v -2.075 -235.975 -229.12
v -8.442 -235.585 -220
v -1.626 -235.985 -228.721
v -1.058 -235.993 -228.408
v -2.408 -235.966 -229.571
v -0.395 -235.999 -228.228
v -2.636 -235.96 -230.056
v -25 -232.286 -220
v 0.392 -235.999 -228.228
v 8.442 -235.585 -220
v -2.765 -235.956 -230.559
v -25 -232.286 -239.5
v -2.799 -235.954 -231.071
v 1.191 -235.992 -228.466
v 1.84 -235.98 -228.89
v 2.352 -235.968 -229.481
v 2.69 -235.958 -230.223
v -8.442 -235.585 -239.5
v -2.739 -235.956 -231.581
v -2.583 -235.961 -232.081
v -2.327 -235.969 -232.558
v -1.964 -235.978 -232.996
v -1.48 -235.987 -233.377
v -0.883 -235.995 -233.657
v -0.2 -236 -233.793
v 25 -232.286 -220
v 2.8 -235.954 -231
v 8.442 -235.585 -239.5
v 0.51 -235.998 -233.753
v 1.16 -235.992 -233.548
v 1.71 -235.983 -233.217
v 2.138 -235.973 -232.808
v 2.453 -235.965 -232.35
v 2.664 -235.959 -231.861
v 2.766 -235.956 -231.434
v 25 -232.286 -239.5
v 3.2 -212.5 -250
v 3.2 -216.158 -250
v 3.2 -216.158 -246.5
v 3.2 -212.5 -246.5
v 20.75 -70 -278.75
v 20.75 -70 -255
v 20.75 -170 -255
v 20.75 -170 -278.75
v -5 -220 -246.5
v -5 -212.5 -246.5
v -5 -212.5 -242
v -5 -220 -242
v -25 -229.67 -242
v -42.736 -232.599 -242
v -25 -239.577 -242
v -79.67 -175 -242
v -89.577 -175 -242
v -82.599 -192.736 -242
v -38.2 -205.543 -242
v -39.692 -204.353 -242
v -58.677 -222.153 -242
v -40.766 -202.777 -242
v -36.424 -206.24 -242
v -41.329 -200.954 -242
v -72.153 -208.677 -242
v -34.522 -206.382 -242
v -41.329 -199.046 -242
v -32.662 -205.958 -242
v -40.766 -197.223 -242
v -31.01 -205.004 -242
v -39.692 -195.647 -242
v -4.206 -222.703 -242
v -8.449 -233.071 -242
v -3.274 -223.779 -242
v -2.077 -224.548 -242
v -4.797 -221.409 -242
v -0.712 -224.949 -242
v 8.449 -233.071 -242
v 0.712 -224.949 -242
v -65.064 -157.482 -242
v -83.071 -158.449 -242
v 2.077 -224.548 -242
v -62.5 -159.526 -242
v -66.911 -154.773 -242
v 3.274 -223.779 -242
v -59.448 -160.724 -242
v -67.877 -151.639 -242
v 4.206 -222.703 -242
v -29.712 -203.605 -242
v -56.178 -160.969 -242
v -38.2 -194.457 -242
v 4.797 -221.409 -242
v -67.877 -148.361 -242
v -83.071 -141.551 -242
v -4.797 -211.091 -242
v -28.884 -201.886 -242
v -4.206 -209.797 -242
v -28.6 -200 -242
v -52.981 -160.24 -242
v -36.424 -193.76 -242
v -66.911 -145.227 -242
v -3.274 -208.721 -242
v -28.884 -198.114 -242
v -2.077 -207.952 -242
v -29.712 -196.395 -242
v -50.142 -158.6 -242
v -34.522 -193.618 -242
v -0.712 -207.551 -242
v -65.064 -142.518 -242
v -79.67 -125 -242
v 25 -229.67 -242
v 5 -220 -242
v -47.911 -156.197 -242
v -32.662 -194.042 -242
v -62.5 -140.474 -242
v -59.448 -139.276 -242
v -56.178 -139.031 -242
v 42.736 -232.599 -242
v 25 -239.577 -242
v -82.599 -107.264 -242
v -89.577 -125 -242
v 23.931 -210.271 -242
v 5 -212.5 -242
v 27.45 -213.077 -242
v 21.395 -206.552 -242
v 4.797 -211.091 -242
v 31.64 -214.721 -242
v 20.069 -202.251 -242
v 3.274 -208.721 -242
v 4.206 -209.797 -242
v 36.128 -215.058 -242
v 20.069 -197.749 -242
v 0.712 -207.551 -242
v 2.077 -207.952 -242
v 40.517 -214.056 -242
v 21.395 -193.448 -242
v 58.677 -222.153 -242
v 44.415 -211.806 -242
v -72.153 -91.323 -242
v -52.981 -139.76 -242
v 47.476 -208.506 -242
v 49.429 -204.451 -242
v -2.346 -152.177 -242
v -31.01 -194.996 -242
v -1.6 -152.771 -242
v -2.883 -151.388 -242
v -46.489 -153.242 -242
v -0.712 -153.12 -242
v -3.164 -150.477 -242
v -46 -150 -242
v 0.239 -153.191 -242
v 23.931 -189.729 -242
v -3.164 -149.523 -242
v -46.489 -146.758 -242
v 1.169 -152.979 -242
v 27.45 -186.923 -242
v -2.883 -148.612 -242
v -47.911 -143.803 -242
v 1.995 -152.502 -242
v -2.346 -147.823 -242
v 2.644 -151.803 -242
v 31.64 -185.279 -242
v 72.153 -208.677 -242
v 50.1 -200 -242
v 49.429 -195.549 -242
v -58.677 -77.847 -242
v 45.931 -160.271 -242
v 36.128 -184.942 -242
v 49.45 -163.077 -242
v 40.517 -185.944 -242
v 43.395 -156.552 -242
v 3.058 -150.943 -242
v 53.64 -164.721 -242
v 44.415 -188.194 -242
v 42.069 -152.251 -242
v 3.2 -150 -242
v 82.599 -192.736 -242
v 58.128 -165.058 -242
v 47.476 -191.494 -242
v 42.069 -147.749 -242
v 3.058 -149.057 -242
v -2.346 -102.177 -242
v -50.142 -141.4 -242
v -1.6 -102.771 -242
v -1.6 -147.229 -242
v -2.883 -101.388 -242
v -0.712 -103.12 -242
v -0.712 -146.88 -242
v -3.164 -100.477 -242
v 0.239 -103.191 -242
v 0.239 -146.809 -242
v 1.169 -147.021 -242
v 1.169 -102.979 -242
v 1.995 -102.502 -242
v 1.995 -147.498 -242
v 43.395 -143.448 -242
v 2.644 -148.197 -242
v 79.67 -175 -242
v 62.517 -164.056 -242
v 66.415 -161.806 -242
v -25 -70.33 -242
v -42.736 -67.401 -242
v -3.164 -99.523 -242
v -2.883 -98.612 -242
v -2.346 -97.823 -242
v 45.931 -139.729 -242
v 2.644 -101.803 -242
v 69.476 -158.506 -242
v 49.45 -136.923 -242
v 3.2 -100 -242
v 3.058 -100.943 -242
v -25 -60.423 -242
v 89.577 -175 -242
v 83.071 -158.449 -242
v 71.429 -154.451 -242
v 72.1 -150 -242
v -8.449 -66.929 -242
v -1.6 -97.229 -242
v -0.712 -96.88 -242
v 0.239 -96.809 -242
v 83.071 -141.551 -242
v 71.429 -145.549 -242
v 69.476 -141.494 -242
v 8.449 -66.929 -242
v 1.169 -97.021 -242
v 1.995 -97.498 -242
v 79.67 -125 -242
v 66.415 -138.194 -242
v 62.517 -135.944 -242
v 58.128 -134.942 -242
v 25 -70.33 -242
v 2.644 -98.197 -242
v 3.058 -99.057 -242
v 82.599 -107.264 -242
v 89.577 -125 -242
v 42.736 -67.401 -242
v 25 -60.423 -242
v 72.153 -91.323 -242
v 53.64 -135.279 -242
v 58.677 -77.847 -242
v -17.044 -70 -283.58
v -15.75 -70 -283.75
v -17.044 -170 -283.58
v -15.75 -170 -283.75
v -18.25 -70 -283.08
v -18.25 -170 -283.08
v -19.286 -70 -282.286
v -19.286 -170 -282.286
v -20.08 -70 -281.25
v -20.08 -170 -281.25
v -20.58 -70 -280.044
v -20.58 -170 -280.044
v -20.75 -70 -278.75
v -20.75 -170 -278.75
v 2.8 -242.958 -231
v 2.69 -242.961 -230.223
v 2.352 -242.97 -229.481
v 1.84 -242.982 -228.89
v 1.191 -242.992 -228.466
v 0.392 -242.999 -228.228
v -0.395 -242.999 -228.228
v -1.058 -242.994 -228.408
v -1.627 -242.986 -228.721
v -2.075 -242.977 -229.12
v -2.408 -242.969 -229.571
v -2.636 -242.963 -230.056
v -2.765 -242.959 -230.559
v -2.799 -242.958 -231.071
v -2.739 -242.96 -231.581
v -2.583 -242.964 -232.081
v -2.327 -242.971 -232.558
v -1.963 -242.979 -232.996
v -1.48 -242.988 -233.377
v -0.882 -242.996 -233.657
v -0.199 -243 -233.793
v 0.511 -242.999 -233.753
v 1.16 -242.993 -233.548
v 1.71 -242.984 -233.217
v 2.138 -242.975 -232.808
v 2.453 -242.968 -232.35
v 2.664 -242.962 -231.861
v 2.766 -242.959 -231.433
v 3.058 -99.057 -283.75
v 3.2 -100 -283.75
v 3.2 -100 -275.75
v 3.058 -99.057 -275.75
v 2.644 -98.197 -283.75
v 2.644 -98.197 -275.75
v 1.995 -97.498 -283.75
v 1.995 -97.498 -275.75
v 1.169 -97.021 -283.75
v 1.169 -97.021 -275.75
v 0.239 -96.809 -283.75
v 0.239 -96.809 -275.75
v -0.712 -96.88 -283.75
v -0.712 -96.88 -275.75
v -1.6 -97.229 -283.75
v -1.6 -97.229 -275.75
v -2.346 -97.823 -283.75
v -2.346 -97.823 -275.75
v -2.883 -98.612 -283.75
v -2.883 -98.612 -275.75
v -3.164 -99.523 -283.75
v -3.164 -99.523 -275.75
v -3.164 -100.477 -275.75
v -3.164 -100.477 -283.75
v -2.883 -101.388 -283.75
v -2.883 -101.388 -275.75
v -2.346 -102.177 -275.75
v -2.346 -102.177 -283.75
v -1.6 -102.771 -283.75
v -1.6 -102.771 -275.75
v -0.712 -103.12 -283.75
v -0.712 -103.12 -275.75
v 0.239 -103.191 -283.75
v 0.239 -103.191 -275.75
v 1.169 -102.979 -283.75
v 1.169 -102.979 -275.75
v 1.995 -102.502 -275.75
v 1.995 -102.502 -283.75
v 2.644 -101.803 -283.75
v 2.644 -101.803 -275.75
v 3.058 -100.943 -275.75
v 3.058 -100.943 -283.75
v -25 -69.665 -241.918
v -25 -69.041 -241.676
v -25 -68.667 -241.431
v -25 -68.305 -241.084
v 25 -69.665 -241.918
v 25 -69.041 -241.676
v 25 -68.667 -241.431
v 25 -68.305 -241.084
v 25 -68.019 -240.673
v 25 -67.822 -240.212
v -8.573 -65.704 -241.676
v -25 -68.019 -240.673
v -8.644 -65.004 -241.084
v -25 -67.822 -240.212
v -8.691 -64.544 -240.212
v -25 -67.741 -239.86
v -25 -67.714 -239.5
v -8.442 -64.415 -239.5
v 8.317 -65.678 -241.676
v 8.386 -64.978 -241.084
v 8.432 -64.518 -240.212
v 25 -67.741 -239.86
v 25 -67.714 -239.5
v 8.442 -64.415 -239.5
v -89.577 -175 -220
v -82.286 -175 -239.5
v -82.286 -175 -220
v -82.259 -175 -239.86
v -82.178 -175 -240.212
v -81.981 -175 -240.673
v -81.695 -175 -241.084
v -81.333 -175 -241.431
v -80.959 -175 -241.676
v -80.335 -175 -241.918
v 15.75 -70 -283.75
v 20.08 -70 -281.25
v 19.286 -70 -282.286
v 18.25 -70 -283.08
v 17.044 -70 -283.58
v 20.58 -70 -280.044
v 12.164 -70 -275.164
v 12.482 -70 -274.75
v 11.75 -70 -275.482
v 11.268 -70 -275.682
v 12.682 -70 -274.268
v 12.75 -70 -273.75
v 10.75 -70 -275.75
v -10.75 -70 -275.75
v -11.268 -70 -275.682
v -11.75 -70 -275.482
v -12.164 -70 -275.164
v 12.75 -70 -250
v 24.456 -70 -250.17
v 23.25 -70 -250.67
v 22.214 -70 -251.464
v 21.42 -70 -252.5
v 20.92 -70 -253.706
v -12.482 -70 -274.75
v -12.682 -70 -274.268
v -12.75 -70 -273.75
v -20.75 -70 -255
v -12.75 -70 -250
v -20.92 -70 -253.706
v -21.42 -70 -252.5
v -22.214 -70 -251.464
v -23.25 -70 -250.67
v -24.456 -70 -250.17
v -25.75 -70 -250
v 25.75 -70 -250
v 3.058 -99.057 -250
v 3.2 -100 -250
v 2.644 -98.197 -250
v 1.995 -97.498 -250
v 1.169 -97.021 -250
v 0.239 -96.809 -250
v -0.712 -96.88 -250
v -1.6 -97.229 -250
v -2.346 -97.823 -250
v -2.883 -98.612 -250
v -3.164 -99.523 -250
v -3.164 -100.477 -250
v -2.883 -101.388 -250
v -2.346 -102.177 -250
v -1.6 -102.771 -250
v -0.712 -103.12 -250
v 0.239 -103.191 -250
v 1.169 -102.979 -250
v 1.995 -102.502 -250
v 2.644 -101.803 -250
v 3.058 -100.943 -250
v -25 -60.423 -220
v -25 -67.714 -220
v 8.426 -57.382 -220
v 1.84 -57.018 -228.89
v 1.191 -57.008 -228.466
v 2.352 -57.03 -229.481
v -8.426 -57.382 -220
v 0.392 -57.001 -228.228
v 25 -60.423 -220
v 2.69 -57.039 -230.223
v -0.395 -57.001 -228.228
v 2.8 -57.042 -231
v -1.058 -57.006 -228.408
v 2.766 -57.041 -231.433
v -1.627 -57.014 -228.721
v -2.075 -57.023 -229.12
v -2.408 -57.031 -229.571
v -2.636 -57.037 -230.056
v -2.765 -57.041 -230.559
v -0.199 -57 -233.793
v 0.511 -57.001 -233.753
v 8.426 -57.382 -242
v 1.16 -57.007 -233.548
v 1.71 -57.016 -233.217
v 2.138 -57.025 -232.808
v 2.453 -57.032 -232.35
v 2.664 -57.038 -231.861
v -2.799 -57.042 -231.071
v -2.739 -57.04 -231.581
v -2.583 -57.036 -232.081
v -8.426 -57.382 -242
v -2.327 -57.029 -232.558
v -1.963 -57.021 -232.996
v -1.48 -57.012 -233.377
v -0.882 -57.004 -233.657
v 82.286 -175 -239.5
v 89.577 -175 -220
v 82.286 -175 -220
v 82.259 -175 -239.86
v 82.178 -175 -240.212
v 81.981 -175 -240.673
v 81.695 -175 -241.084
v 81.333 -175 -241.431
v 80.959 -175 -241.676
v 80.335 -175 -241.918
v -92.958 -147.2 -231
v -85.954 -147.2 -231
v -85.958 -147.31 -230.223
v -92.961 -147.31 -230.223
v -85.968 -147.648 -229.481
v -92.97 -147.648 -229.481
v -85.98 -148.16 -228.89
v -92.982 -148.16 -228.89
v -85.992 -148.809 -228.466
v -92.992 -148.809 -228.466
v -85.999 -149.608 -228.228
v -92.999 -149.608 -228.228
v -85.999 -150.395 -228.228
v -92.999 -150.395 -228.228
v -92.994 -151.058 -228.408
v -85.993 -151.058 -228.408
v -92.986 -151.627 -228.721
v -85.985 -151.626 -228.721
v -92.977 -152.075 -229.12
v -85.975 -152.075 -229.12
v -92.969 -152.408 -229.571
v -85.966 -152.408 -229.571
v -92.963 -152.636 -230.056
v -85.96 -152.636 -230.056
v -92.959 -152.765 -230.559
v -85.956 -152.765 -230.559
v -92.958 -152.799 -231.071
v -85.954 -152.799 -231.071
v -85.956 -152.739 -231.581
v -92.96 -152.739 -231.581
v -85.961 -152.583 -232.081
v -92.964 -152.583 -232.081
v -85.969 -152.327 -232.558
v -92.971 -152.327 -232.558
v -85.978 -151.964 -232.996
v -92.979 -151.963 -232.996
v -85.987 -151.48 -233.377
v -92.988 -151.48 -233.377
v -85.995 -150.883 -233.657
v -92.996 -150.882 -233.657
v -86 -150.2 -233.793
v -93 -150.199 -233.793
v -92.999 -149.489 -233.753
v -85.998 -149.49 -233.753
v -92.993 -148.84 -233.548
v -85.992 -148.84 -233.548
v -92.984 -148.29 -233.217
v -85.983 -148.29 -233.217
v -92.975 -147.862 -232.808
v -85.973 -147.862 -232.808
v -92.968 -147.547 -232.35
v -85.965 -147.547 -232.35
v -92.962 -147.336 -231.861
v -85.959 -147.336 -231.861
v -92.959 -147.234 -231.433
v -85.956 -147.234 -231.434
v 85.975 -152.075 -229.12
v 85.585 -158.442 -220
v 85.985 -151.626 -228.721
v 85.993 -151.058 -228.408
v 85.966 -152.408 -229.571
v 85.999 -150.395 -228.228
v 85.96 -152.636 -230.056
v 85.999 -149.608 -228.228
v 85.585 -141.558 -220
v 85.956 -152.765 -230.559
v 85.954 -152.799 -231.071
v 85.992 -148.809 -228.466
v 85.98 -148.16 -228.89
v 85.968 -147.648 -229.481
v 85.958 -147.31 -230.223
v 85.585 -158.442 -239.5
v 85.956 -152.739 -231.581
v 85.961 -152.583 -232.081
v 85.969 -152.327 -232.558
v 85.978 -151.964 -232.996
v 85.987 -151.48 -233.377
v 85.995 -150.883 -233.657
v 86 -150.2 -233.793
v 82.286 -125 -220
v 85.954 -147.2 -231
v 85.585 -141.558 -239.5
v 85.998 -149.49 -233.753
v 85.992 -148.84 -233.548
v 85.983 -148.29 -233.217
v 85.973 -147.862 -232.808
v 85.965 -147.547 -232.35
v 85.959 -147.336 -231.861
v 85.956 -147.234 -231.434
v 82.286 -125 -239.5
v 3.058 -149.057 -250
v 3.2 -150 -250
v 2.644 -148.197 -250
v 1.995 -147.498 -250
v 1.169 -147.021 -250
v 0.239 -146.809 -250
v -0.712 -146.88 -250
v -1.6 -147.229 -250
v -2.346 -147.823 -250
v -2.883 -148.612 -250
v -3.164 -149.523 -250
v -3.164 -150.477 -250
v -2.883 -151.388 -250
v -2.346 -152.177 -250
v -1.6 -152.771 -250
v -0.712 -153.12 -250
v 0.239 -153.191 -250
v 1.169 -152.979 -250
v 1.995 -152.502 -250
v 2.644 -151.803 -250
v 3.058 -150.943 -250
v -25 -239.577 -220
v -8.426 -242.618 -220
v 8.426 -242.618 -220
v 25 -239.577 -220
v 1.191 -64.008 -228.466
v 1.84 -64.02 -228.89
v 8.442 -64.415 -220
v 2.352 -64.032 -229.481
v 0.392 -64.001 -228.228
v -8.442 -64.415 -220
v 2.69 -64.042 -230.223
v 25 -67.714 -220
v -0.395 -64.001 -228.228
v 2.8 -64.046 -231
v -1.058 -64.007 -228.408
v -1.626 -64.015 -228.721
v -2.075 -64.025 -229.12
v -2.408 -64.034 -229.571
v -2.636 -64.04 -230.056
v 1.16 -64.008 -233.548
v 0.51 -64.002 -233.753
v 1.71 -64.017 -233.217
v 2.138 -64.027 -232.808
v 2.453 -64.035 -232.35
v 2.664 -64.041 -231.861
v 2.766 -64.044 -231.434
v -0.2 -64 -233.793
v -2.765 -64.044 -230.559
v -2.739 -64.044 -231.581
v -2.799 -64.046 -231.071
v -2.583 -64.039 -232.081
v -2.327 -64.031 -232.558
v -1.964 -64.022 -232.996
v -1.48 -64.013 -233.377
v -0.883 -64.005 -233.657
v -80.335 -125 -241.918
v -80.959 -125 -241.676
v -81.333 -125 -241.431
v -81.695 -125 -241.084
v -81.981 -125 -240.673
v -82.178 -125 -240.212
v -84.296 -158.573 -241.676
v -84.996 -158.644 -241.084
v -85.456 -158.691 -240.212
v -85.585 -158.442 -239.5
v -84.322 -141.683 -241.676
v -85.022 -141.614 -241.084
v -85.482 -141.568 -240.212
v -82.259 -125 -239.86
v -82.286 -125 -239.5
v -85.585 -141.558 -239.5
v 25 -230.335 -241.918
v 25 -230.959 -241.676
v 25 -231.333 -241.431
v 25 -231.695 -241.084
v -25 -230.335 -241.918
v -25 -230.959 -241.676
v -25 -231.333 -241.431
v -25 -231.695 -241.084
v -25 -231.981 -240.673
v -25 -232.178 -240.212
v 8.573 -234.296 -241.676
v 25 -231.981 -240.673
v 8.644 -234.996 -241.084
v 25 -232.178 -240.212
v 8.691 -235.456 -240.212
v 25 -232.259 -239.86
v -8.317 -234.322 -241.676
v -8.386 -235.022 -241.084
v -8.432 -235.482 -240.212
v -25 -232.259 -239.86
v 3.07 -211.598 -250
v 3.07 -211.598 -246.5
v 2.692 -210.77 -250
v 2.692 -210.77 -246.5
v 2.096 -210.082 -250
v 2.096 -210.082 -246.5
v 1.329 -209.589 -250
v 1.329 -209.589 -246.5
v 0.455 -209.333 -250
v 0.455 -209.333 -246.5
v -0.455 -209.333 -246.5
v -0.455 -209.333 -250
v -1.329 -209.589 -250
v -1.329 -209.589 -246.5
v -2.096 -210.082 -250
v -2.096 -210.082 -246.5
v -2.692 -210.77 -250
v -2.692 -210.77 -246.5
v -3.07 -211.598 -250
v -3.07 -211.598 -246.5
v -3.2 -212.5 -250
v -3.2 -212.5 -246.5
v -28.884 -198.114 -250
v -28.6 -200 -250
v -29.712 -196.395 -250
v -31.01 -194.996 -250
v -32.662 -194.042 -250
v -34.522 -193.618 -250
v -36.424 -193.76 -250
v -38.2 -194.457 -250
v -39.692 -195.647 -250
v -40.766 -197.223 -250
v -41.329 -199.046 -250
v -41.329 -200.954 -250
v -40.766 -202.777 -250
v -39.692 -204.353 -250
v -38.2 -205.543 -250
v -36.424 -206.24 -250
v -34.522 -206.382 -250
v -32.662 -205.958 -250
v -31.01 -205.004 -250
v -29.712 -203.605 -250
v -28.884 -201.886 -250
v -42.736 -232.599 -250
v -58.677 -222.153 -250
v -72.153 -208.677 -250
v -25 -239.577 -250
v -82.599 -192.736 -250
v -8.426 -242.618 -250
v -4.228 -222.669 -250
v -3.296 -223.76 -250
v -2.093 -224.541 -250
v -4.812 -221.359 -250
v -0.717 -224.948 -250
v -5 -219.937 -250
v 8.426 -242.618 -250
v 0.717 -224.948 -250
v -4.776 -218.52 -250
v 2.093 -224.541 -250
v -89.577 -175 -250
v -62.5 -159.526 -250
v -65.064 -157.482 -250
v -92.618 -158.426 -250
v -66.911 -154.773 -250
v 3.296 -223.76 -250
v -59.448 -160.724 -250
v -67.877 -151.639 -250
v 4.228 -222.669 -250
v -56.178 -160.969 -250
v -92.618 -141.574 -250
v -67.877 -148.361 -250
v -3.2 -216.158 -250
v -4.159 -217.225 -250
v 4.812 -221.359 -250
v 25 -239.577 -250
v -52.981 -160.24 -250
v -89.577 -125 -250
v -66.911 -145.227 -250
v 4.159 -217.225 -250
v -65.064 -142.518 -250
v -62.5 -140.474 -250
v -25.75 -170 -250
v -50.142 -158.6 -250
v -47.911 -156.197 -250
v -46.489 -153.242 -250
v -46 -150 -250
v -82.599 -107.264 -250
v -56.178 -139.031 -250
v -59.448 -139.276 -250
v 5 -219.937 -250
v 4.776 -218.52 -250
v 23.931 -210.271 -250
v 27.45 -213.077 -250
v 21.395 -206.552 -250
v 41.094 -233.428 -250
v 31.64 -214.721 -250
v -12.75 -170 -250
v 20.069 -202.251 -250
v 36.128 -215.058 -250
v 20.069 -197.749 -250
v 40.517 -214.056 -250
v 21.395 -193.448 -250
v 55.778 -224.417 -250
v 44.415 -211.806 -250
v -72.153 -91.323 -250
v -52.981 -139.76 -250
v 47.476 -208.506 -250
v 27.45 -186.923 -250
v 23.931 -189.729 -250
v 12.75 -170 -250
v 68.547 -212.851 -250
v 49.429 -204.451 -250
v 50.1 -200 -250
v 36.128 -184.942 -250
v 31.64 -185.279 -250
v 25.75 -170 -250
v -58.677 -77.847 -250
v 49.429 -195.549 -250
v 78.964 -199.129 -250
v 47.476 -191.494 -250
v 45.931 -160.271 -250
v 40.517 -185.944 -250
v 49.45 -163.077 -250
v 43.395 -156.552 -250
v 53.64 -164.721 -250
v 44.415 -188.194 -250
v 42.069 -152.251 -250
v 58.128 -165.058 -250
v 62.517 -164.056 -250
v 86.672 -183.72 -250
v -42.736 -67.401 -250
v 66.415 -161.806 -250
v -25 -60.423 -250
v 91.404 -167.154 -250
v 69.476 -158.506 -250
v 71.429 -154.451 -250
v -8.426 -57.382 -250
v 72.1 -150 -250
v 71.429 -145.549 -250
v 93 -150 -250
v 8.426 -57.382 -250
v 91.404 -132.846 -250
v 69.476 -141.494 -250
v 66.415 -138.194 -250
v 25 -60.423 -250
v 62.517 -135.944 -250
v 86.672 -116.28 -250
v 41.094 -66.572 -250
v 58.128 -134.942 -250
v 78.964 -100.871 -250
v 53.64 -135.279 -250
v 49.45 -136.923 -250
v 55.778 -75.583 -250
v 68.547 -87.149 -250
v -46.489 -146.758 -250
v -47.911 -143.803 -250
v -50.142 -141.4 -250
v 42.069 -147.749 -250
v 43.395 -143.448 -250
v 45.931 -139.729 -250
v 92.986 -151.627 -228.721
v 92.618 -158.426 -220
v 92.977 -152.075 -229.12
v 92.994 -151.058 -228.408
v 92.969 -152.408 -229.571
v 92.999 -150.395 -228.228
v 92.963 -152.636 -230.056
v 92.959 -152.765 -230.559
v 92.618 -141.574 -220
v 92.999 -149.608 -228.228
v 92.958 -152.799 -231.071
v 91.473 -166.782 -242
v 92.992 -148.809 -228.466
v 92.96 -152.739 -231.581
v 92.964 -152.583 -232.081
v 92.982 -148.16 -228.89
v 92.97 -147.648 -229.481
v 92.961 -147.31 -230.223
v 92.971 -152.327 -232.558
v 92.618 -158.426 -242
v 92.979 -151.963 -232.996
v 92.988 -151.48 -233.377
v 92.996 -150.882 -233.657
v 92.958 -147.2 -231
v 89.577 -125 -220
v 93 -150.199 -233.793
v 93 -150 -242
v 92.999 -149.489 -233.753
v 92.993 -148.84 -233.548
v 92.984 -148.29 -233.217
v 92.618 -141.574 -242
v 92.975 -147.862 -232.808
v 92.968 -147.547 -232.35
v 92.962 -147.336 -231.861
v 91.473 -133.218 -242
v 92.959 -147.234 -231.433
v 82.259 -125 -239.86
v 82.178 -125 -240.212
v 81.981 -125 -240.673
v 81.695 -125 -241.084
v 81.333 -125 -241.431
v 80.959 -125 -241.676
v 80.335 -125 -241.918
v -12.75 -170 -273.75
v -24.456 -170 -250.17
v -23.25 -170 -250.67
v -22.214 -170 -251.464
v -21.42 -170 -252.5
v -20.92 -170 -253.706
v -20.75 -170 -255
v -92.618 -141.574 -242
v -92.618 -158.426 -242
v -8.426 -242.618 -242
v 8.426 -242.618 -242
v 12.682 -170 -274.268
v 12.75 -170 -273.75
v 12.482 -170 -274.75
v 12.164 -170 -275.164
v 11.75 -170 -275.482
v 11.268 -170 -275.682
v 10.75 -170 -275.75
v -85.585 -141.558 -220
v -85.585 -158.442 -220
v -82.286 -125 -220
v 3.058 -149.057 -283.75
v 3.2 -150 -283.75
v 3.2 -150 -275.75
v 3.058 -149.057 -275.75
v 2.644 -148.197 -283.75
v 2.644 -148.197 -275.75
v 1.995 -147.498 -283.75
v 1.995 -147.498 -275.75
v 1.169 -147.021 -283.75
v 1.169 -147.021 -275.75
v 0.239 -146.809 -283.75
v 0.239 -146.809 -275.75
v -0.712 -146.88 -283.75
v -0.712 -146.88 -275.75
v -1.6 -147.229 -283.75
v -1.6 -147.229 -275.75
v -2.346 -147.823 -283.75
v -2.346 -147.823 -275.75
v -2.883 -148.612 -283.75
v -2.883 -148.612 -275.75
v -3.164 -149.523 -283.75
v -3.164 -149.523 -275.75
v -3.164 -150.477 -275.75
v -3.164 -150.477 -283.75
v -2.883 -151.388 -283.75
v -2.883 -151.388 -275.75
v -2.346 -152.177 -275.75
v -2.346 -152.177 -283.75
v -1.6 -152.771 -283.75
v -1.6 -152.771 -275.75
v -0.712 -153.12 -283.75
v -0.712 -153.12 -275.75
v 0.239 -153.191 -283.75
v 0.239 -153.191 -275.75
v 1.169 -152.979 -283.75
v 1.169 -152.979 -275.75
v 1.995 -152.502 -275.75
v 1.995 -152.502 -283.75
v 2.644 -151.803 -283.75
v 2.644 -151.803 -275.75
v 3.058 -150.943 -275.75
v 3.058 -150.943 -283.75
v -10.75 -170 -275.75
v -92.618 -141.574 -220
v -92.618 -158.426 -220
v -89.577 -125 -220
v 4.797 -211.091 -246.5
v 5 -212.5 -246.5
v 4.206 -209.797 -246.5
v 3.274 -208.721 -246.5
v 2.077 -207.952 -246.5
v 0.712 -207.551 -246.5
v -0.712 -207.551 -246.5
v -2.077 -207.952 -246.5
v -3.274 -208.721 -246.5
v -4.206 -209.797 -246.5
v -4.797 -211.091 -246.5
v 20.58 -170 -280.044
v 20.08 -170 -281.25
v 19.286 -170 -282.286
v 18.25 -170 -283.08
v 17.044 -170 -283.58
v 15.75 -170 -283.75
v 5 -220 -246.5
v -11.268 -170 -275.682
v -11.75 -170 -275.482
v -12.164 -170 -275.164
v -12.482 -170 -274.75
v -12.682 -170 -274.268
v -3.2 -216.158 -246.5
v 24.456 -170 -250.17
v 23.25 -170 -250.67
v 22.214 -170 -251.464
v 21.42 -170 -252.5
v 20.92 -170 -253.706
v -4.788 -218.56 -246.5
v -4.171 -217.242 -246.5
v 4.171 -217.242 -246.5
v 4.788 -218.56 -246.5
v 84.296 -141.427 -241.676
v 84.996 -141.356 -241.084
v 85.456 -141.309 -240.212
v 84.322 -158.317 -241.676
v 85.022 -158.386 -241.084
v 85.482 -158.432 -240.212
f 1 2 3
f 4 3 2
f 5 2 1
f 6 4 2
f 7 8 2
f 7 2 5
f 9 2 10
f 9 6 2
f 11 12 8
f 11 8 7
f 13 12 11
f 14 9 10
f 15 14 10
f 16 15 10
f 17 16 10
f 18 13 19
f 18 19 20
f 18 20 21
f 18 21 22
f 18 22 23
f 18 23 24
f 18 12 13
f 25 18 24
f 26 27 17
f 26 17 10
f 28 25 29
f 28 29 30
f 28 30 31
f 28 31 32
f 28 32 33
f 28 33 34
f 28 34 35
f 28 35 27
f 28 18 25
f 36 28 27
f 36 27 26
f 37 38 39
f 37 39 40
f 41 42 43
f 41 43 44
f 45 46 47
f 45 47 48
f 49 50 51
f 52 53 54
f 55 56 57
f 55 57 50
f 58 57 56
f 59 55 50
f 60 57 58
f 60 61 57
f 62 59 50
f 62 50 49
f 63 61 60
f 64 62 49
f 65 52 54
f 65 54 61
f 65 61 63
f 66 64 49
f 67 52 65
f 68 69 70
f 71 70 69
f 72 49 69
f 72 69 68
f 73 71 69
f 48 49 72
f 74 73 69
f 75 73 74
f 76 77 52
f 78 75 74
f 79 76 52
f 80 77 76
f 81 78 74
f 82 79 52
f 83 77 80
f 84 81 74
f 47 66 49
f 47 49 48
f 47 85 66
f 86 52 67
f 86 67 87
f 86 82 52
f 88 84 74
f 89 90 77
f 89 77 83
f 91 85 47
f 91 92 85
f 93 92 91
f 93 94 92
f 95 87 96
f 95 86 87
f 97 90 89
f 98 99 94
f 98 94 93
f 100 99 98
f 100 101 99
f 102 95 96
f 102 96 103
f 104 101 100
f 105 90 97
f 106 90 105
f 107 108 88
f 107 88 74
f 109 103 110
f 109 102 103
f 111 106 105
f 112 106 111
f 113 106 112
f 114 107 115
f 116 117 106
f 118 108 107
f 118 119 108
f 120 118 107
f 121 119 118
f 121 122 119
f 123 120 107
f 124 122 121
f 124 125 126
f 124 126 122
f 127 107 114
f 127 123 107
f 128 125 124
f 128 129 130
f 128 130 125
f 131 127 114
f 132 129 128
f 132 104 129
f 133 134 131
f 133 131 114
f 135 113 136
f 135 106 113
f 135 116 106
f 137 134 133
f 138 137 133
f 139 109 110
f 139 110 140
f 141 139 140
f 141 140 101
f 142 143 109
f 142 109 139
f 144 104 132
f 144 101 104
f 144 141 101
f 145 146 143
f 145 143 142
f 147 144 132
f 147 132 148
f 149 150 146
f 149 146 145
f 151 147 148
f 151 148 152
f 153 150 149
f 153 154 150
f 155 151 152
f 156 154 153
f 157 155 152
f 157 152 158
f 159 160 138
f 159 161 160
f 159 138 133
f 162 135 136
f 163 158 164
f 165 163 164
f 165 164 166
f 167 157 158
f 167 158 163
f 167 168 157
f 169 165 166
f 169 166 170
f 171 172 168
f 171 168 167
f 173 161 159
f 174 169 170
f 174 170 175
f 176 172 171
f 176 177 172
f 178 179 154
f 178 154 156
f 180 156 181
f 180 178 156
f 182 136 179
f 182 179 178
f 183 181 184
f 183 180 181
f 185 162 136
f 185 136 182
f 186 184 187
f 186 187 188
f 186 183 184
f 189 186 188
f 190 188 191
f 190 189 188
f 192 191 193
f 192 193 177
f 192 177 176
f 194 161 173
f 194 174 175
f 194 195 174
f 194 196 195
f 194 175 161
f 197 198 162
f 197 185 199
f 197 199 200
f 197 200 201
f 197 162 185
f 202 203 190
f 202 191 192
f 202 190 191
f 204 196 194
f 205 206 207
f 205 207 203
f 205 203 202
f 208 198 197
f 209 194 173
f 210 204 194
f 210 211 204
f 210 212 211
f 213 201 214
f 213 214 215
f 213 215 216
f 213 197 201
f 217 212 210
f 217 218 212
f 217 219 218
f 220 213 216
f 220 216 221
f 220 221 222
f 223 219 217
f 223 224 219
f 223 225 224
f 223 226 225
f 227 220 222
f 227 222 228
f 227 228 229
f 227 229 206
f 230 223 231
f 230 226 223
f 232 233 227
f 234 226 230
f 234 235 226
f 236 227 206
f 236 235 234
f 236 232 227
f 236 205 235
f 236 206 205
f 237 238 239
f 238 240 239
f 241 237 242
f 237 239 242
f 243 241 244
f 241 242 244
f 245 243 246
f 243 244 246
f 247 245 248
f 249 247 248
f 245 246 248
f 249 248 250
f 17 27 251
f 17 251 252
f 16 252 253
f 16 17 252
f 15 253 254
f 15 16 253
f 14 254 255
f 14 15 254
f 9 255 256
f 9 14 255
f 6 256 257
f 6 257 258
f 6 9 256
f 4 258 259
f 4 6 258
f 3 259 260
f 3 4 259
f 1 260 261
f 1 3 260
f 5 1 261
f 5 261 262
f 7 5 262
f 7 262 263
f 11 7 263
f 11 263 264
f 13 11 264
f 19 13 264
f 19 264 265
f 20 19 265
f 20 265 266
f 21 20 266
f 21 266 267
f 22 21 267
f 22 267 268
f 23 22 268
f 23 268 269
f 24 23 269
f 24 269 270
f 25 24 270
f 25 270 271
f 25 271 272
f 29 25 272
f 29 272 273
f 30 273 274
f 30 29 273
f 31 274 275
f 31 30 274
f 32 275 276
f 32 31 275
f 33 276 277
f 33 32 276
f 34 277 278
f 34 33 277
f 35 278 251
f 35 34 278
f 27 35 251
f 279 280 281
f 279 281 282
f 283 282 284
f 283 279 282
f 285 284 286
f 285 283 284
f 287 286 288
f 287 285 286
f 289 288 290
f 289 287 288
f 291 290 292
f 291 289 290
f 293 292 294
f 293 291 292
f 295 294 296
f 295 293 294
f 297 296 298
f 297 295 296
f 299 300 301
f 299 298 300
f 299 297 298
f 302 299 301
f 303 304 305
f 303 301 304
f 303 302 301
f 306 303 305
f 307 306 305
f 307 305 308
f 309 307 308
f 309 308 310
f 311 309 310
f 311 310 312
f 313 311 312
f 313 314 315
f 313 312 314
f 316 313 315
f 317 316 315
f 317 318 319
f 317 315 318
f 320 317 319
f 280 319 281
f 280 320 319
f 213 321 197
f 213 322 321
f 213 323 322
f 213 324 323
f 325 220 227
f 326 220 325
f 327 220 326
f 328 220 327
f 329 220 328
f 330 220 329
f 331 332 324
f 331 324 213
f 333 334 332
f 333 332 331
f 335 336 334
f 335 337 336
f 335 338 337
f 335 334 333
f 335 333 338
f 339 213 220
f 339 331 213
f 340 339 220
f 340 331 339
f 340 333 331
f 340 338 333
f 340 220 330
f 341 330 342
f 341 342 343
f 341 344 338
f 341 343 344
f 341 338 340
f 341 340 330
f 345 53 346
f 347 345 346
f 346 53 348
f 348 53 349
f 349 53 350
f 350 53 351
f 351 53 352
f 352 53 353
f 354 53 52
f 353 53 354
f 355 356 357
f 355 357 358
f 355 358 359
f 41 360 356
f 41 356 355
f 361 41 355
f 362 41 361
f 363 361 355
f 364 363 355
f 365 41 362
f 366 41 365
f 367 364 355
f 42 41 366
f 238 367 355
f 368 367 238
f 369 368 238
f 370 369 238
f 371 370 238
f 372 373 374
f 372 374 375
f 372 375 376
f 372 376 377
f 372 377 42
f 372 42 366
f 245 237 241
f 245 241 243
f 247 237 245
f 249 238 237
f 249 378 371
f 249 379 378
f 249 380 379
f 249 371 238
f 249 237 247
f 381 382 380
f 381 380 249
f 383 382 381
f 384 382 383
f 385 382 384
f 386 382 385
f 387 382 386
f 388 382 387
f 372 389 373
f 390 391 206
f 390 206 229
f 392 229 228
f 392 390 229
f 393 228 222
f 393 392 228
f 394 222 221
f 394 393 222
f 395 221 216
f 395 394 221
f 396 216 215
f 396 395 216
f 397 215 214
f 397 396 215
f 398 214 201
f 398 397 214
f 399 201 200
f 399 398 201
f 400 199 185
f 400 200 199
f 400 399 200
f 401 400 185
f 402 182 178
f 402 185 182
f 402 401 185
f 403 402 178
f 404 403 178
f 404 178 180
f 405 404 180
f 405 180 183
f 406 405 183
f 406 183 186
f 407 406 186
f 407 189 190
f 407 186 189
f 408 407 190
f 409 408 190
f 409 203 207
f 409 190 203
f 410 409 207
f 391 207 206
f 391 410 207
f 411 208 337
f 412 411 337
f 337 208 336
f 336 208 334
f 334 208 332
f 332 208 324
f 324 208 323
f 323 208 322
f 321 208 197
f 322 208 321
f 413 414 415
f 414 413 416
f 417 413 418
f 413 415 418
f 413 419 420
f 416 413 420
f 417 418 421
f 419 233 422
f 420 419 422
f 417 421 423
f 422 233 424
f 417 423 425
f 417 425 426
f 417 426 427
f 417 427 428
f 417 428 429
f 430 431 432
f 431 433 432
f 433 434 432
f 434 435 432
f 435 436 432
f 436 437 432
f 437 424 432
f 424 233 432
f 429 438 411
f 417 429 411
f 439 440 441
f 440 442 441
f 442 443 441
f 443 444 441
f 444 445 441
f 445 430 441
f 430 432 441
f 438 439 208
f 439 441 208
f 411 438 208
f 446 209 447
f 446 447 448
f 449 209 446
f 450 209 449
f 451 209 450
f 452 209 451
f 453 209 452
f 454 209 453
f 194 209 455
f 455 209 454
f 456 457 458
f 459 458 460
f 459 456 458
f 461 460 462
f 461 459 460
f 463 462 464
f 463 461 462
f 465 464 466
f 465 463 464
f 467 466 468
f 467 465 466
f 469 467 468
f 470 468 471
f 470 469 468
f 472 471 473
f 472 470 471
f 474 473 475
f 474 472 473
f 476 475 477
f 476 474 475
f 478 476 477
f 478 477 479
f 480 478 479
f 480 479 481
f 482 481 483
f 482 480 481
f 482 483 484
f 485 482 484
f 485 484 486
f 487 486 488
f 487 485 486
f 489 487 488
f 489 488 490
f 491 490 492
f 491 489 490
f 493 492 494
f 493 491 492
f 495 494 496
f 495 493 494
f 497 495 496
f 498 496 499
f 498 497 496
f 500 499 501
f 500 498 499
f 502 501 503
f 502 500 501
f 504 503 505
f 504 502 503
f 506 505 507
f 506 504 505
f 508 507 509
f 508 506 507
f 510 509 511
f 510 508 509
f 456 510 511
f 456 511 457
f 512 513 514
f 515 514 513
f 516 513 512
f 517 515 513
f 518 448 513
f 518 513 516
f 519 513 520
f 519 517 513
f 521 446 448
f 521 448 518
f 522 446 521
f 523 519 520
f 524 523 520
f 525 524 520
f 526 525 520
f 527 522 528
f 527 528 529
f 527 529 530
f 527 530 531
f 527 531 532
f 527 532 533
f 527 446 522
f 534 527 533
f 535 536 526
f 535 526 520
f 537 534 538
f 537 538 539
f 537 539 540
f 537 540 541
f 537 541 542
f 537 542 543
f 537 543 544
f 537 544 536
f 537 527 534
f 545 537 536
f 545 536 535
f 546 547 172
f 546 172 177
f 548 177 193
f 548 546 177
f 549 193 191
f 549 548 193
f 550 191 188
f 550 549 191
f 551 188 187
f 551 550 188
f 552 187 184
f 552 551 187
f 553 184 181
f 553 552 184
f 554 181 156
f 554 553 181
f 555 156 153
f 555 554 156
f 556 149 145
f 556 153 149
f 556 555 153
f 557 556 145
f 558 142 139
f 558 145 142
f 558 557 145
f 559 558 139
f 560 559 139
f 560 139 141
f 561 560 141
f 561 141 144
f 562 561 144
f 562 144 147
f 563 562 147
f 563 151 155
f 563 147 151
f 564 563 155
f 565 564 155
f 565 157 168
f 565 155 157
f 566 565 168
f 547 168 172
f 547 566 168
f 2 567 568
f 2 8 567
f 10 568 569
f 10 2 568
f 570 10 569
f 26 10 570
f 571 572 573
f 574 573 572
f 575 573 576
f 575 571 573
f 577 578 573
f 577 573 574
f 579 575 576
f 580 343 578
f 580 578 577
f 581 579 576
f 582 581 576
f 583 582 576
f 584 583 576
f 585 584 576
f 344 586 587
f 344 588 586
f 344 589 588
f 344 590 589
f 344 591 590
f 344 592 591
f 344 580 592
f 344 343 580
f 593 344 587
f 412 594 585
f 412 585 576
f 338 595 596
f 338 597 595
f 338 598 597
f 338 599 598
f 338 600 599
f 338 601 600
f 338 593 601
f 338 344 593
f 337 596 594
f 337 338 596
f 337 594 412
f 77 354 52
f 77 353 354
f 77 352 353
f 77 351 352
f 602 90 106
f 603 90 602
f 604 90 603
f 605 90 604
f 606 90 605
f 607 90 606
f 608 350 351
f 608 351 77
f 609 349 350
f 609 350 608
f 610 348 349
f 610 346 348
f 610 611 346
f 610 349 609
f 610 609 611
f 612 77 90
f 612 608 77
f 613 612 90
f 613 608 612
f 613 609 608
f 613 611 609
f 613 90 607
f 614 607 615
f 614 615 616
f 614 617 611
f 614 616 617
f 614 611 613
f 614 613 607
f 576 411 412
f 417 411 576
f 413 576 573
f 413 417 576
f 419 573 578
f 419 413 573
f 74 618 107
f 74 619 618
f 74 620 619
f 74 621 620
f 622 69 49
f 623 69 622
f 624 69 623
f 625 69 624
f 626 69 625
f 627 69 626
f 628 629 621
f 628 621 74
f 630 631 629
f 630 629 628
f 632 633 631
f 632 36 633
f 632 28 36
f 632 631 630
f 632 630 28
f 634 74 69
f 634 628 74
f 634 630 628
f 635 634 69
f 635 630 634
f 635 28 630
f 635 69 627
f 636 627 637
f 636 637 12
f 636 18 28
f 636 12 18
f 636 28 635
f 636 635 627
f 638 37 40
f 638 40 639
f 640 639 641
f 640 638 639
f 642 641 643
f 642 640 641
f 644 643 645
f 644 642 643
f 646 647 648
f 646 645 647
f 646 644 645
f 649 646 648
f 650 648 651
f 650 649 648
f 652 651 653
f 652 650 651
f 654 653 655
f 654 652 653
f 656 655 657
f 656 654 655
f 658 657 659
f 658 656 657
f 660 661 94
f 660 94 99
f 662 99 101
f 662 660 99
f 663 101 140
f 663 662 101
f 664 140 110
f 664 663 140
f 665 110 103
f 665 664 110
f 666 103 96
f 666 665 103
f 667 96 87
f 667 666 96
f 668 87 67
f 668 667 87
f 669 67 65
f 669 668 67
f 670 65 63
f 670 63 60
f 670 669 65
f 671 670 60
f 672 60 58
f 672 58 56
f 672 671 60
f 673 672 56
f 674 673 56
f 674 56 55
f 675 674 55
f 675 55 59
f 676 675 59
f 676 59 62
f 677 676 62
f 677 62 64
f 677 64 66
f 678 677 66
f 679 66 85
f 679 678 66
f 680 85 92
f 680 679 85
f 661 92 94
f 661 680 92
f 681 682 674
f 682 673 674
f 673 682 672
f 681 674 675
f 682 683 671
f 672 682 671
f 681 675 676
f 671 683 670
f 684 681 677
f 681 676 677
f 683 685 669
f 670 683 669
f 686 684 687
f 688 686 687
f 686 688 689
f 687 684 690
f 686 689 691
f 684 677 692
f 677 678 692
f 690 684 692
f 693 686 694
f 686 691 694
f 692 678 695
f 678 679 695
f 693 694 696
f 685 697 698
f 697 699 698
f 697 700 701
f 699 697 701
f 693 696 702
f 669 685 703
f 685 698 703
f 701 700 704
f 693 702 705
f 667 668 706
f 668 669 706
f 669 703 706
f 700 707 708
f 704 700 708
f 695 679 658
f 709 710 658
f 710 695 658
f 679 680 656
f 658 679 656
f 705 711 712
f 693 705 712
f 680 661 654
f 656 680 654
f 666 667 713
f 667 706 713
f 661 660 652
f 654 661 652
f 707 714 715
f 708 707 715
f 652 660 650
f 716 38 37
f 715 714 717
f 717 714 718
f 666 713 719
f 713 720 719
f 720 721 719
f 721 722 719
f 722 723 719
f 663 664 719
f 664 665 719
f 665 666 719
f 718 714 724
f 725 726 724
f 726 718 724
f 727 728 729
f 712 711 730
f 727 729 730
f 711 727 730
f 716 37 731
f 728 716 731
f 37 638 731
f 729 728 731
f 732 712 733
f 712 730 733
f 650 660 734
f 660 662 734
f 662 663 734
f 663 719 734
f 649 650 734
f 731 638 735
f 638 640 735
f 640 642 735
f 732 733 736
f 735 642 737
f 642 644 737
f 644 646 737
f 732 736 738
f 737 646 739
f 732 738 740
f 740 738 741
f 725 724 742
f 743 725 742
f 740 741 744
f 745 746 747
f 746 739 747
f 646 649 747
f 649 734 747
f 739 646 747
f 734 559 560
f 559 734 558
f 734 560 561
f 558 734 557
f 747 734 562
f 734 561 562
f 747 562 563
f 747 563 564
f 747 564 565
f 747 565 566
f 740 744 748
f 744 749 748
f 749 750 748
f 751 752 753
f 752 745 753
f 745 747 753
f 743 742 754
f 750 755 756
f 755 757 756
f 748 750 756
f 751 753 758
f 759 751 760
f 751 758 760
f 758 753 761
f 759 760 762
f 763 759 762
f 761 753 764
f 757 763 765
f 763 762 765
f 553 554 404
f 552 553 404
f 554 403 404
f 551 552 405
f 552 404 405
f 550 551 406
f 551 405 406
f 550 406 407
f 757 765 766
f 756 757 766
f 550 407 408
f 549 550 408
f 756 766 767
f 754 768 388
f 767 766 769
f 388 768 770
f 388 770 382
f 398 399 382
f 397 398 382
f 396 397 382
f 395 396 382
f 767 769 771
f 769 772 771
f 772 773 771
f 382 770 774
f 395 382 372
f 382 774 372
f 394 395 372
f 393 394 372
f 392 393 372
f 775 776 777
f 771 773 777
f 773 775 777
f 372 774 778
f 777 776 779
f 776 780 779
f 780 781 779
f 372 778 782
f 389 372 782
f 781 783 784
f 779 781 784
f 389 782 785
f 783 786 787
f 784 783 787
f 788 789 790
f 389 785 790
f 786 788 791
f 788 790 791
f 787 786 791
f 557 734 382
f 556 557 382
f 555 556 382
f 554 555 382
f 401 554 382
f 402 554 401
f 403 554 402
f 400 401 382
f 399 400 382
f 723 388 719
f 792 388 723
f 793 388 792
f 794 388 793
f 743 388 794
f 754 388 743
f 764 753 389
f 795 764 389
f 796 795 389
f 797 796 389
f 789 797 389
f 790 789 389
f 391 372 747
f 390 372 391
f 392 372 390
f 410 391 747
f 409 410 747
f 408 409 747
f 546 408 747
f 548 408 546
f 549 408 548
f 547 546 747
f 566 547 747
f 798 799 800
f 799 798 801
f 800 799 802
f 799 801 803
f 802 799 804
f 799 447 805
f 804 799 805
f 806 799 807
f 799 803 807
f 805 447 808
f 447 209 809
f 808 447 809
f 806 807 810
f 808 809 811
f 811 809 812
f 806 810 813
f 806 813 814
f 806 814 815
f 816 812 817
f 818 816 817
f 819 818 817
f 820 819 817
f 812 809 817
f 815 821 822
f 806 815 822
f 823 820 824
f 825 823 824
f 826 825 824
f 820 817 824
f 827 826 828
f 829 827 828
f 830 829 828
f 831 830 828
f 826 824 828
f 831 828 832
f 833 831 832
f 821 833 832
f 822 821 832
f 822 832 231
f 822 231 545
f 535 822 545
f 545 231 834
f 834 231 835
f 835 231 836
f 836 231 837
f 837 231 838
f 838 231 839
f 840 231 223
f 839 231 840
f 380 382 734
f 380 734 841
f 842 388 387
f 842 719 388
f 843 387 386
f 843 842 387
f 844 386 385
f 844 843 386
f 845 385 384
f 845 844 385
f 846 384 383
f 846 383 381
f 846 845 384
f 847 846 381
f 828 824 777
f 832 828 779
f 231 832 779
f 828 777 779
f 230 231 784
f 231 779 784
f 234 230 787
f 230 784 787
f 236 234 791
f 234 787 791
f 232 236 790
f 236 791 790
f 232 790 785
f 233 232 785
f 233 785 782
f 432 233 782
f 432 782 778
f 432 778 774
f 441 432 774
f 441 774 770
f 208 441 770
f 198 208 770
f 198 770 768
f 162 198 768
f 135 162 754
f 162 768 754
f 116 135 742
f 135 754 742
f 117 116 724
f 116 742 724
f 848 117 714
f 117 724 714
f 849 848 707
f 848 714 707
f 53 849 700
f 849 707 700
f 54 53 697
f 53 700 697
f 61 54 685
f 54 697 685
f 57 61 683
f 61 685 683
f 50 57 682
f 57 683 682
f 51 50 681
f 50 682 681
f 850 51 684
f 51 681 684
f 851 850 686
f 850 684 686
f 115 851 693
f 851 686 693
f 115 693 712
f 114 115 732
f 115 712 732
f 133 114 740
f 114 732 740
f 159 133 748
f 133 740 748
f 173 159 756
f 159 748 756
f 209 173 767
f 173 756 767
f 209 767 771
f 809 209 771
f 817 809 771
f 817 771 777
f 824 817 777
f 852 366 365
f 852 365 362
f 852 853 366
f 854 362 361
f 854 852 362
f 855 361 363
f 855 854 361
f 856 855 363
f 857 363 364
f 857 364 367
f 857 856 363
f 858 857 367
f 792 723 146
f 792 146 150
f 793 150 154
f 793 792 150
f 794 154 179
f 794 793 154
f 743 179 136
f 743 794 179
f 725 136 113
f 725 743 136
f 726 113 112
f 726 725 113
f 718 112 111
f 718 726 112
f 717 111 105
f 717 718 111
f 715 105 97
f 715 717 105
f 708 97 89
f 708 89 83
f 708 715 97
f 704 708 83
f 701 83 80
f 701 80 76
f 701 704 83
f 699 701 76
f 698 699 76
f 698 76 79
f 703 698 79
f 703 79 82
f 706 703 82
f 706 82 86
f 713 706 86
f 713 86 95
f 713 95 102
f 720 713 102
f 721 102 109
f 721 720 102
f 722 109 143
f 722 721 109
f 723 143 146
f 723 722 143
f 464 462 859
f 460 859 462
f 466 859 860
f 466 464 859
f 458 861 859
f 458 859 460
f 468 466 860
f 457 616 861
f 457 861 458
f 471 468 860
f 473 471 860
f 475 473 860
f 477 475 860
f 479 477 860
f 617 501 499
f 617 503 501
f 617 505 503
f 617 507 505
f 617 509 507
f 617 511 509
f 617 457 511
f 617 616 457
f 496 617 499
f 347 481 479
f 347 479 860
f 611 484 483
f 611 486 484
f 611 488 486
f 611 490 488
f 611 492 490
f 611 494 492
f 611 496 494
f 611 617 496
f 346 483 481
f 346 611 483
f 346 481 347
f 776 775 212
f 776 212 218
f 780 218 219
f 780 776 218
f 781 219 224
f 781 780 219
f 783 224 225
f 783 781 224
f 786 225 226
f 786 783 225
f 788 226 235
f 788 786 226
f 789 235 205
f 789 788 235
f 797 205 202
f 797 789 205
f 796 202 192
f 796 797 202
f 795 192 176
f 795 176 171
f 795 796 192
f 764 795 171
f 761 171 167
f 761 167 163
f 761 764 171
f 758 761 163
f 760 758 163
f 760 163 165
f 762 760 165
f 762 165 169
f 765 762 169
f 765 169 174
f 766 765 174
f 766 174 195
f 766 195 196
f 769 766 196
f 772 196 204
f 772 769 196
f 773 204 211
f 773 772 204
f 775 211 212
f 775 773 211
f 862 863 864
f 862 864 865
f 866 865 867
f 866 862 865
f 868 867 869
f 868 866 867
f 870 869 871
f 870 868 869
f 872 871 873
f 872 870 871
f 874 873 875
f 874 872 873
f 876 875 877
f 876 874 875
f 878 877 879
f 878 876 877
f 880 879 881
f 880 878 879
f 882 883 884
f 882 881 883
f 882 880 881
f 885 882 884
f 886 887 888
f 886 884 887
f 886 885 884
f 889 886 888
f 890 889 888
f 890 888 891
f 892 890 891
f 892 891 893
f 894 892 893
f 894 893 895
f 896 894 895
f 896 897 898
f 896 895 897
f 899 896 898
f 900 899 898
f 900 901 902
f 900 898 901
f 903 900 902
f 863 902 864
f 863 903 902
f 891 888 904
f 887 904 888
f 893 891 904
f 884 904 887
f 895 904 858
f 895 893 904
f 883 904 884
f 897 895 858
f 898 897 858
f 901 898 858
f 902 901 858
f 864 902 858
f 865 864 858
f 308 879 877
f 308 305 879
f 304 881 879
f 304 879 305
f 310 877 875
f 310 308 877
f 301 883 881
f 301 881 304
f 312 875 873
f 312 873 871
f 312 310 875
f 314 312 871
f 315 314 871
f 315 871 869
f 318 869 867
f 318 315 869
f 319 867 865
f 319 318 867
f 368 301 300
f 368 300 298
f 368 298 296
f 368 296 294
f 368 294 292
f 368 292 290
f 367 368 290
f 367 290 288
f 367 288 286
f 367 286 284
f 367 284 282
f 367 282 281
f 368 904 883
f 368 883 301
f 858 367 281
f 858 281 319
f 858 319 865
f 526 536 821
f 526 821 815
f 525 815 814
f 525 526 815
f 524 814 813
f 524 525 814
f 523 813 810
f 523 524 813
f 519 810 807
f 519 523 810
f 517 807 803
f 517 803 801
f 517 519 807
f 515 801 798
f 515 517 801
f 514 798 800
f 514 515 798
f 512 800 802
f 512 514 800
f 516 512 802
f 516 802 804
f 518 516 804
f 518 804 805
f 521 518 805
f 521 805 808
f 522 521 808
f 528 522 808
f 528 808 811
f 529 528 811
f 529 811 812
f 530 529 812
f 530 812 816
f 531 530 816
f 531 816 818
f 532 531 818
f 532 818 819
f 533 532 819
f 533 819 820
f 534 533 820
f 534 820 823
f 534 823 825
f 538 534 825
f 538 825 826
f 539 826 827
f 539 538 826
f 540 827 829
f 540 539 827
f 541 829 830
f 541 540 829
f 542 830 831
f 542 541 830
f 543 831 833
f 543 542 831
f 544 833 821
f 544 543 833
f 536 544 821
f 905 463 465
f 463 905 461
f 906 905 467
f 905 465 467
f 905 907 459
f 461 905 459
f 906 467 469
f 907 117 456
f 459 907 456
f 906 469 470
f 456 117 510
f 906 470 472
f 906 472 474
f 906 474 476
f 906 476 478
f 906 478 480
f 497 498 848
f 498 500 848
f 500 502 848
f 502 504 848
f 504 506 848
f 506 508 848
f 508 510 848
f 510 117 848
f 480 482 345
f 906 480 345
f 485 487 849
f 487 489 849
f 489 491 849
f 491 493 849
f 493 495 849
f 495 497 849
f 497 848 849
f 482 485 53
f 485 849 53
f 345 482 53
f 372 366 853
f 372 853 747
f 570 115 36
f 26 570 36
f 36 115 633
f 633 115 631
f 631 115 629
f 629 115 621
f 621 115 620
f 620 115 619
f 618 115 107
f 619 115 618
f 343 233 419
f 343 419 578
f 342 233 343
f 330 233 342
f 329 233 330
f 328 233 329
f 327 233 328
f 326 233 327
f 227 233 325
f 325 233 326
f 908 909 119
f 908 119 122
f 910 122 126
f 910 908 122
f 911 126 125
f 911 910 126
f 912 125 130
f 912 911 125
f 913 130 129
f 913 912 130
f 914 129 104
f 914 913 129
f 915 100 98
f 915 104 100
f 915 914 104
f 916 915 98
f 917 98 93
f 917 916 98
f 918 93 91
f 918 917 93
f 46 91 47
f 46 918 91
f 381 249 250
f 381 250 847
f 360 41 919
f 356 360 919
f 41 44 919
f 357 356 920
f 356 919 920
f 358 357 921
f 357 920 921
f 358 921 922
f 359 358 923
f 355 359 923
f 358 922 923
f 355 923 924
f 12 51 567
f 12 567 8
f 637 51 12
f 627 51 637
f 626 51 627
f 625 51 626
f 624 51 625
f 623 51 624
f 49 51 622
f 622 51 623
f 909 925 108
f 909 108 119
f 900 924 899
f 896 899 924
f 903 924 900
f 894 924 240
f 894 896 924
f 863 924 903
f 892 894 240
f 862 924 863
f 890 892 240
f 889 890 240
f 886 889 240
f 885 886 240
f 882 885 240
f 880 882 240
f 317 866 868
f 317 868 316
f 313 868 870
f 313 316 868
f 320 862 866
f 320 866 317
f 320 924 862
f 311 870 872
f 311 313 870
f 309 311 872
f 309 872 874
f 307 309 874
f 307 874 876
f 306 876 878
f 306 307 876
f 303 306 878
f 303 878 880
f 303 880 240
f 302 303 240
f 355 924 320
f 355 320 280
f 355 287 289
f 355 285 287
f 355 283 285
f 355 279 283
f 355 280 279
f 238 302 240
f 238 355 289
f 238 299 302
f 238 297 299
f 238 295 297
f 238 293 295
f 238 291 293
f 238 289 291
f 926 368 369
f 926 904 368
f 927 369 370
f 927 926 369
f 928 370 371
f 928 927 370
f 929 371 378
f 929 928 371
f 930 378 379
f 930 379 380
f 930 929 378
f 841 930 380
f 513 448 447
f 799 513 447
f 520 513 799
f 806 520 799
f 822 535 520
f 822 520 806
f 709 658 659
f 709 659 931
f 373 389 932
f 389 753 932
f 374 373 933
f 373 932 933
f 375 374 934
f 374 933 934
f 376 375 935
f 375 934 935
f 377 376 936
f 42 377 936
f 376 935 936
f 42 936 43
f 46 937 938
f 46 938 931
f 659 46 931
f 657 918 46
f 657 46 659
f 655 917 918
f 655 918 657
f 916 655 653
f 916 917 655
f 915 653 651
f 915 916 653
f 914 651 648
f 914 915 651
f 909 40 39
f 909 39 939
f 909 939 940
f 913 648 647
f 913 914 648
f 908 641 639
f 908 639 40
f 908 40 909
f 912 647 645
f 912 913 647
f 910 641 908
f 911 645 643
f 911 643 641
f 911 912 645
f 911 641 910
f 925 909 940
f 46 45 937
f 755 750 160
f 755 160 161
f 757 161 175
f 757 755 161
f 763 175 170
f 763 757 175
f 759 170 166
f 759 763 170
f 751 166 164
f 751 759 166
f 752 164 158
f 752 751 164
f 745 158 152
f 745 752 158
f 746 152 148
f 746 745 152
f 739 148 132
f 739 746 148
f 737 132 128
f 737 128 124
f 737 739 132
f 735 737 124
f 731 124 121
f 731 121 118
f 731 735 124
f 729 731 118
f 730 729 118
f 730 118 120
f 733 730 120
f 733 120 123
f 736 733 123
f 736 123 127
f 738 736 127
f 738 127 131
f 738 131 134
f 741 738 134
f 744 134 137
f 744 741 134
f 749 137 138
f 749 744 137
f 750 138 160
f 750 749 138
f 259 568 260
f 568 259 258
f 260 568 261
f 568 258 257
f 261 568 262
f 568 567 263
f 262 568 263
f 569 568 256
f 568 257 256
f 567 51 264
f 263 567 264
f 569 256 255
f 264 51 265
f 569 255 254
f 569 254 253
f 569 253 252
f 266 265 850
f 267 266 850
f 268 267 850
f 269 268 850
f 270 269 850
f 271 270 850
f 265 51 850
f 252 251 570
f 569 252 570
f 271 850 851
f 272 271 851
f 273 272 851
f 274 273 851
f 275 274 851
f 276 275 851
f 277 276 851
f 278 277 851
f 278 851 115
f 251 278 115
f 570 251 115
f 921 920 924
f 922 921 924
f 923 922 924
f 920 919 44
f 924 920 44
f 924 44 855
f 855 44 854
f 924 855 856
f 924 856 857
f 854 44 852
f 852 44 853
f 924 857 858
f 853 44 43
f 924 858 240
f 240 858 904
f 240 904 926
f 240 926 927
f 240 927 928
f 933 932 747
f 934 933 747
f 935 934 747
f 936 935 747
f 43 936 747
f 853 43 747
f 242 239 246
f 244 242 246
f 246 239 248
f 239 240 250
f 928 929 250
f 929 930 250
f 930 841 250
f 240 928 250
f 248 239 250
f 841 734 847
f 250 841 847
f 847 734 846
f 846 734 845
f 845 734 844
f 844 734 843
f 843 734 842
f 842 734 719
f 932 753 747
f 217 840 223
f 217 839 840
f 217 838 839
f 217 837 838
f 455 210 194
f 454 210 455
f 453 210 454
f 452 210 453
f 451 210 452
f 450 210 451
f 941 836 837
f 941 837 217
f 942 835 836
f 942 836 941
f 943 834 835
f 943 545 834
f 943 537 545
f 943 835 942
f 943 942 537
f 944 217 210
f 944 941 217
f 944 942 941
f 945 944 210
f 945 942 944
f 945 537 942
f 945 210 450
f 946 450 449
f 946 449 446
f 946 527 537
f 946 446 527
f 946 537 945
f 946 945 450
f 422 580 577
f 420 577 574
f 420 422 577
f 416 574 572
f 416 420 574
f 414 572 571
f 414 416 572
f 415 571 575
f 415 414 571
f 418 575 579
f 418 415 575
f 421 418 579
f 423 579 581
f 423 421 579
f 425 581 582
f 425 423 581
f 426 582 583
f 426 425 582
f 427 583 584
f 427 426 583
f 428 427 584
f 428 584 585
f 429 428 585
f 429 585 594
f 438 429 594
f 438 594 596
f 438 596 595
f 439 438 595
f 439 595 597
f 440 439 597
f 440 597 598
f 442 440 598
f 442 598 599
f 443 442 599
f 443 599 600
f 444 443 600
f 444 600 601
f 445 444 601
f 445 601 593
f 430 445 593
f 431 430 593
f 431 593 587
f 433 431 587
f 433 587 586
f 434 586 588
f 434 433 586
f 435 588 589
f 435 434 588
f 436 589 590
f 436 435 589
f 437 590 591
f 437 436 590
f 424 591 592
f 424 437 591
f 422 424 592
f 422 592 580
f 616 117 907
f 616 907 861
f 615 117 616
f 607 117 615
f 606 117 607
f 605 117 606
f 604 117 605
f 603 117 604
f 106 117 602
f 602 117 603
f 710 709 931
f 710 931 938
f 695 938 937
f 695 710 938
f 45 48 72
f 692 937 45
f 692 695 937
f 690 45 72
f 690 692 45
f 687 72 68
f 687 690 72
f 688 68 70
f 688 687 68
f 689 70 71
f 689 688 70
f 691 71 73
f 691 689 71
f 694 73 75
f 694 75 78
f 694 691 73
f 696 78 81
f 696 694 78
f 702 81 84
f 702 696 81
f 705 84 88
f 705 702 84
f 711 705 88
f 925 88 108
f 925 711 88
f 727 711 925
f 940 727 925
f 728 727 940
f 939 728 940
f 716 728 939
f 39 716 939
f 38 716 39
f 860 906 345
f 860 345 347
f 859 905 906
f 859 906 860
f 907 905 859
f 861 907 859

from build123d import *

# Parameters (mm, degrees)
SKETCH156_R       = 3.2
EXTRUDE057_DEPTH  = 50
EXTRUDE054_DEPTH  = 10
CYLINDER179_R     = 2.8
CYLINDER179_DEPTH = 300
CYLINDER180_R     = 2.8
CYLINDER180_DEPTH = 300
EXTRUDE055_DEPTH  = 30
SKETCH152_R       = 93
SKETCH152_R_2     = 11
SKETCH152_R_3     = 15.1
SKETCH152_R_4     = 6.4
EXTRUDE053_DEPTH  = 8
EXTRUDE056_DEPTH  = 100
FILLET024_R       = 5
FILLET025_R       = 2
FILLET026_R       = 5
FILLET027_R       = 2.5


with BuildPart() as extrude057:
    # Sketch156 → Extrude057 (new body)
    with BuildSketch(Plane.XY):
        with Locations((0, -150)):
            Circle(SKETCH156_R)
        with Locations((0, -100)):
            Circle(SKETCH156_R)
    extrude(amount=EXTRUDE057_DEPTH)


with BuildPart() as extrude057_1:
    # Extrude057 placement: moved
    add(extrude057.part.moved(Location((0, 0, -290))))


with BuildPart() as miccutlevel006:
    # Sketch153 → Extrude054 (new body)
    with BuildSketch(Plane.XY):
        with BuildLine():
            ThreePointArc((-5, -220), (0, -225), (5, -220))
            Line((5, -220), (5, -212.5))
            ThreePointArc((5, -212.5), (0, -207.5), (-5, -212.5))
            Line((-5, -212.5), (-5, -220))
        make_face()
    extrude(amount=EXTRUDE054_DEPTH)


with BuildPart() as miccutlevel006_1:
    # Extrude054 placement: moved
    add(miccutlevel006.part.moved(Location((0, 0, -246.5))))


with BuildPart() as cylinder179:
    # Cylinder179 → Cylinder179 (new body)
    with BuildSketch(Plane(origin=(0, 0, 90), x_dir=(1, 0, 0), z_dir=(0, -1, 0))):
        Circle(CYLINDER179_R)
    extrude(amount=CYLINDER179_DEPTH)


with BuildPart() as m4heatsetcuts004:
    # Cylinder180 → Cylinder180 (new body)
    with BuildSketch(Plane(origin=(-150, -150, 90), x_dir=(0, 1, 0), z_dir=(1, 0, 0))):
        Circle(CYLINDER180_R)
    extrude(amount=CYLINDER180_DEPTH)

    # Fusion131: union Cylinder179
    add(cylinder179.part)


with BuildPart() as m4heatsetcuts004_1:
    # Fusion131 placement: moved
    add(m4heatsetcuts004.part.moved(Location((0, 0, -321))))


with BuildPart() as srsholdslevel006:
    # Sketch154 → Extrude055 (new body)
    with BuildSketch(Plane.XY):
        with BuildLine():
            ThreePointArc((-89.576783, -125), (-93, -150), (-89.576783, -175))
            Line((-89.576783, -175), (-82.286086, -175))
            ThreePointArc((-82.286086, -125), (-86, -150), (-82.286086, -175))
            Line((-89.576783, -125), (-82.286086, -125))
        make_face()
        with BuildLine():
            ThreePointArc((25, -60.423217), (0, -57), (-25, -60.423217))
            Line((-25, -60.423217), (-25, -67.713914))
            ThreePointArc((25, -67.713914), (0, -64), (-25, -67.713914))
            Line((25, -60.423217), (25, -67.713914))
        make_face()
        with BuildLine():
            ThreePointArc((89.576783, -175), (93, -150), (89.576783, -125))
            Line((89.576783, -125), (82.286086, -125))
            ThreePointArc((82.286086, -175), (86, -150), (82.286086, -125))
            Line((89.576783, -175), (82.286086, -175))
        make_face()
        with BuildLine():
            ThreePointArc((-25, -239.576783), (0, -243), (25, -239.576783))
            Line((25, -239.576783), (25, -232.286086))
            ThreePointArc((-25, -232.286086), (0, -236), (25, -232.286086))
            Line((-25, -239.576783), (-25, -232.286086))
        make_face()
    extrude(amount=EXTRUDE055_DEPTH)


with BuildPart() as srsholdslevel006_1:
    # Extrude055 placement: moved
    add(srsholdslevel006.part.moved(Location((0, 0, -250))))


with BuildPart() as level5s009:
    # Sketch152 → Extrude053 (new body)
    with BuildSketch(Plane.XY):
        with Locations((0, -150)):
            Circle(SKETCH152_R)
        with Locations((-57, -150)):
            Circle(SKETCH152_R_2, mode=Mode.SUBTRACT)
        with Locations((57, -150)):
            Circle(SKETCH152_R_3, mode=Mode.SUBTRACT)
        with Locations((35, -200)):
            Circle(SKETCH152_R_3, mode=Mode.SUBTRACT)
        with Locations((-35, -200)):
            Circle(SKETCH152_R_4, mode=Mode.SUBTRACT)
        with BuildLine():
            ThreePointArc((-3.2, -216.158125), (0, -225), (3.2, -216.158125))
            Line((3.2, -216.158125), (3.2, -212.5))
            ThreePointArc((3.2, -212.5), (0, -209.3), (-3.2, -212.5))
            Line((-3.2, -212.5), (-3.2, -216.158125))
        make_face(mode=Mode.SUBTRACT)
    extrude(amount=EXTRUDE053_DEPTH)


with BuildPart() as level5s009_1:
    # Extrude053 placement: moved
    add(level5s009.part.moved(Location((0, 0, -250))))

    # Fusion130: union srsHoldsLevel006
    add(srsholdslevel006_1.part)

    # Cut095: cut m4HeatSetCuts004
    add(m4heatsetcuts004_1.part, mode=Mode.SUBTRACT)

    # Cut096: cut micCutLevel006
    add(miccutlevel006_1.part, mode=Mode.SUBTRACT)


with BuildPart() as level5soriginal:
    # Sketch155 → Extrude056 (new body)
    with BuildSketch(Plane.XZ):
        Polygon((-20.75, -250), (-12.75, -250), (-12.75, -275.75), (12.75, -275.75), (12.75, -250), (20.75, -250), (20.75, -283.75), (-20.75, -283.75), align=None)
    extrude(amount=EXTRUDE056_DEPTH)


with BuildPart() as level5soriginal_1:
    # Extrude056 placement: moved
    add(level5soriginal.part.moved(Location((0, -70, 0))))

    # Fillet024
    fillet024_edges = [level5soriginal_1.edges().sort_by_distance(p)[0] for p in [
        (20.75, -120, -283.75),
        (-20.75, -120, -283.75),
    ]]
    fillet(fillet024_edges, radius=FILLET024_R)

    # Fillet025
    fillet025_edges = [level5soriginal_1.edges().sort_by_distance(p)[0] for p in [
        (12.75, -120, -275.75),
        (-12.75, -120, -275.75),
    ]]
    fillet(fillet025_edges, radius=FILLET025_R)

    # Fusion132: union level5s009
    add(level5s009_1.part)

    # Fillet026
    fillet026_edges = [level5soriginal_1.edges().sort_by_distance(p)[0] for p in [
        (-20.75, -120, -250),
        (20.75, -120, -250),
    ]]
    fillet(fillet026_edges, radius=FILLET026_R)

    # Cut097: cut Extrude057
    add(extrude057_1.part, mode=Mode.SUBTRACT)

    # Fillet027
    fillet027_edges = [level5soriginal_1.edges().sort_by_distance(p)[0] for p in [
        (86, -150, -242),
        (0, -64, -242),
        (0, -236, -242),
        (-86, -150, -242),
    ]]
    fillet(fillet027_edges, radius=FILLET027_R)


solid = level5soriginal_1.part
